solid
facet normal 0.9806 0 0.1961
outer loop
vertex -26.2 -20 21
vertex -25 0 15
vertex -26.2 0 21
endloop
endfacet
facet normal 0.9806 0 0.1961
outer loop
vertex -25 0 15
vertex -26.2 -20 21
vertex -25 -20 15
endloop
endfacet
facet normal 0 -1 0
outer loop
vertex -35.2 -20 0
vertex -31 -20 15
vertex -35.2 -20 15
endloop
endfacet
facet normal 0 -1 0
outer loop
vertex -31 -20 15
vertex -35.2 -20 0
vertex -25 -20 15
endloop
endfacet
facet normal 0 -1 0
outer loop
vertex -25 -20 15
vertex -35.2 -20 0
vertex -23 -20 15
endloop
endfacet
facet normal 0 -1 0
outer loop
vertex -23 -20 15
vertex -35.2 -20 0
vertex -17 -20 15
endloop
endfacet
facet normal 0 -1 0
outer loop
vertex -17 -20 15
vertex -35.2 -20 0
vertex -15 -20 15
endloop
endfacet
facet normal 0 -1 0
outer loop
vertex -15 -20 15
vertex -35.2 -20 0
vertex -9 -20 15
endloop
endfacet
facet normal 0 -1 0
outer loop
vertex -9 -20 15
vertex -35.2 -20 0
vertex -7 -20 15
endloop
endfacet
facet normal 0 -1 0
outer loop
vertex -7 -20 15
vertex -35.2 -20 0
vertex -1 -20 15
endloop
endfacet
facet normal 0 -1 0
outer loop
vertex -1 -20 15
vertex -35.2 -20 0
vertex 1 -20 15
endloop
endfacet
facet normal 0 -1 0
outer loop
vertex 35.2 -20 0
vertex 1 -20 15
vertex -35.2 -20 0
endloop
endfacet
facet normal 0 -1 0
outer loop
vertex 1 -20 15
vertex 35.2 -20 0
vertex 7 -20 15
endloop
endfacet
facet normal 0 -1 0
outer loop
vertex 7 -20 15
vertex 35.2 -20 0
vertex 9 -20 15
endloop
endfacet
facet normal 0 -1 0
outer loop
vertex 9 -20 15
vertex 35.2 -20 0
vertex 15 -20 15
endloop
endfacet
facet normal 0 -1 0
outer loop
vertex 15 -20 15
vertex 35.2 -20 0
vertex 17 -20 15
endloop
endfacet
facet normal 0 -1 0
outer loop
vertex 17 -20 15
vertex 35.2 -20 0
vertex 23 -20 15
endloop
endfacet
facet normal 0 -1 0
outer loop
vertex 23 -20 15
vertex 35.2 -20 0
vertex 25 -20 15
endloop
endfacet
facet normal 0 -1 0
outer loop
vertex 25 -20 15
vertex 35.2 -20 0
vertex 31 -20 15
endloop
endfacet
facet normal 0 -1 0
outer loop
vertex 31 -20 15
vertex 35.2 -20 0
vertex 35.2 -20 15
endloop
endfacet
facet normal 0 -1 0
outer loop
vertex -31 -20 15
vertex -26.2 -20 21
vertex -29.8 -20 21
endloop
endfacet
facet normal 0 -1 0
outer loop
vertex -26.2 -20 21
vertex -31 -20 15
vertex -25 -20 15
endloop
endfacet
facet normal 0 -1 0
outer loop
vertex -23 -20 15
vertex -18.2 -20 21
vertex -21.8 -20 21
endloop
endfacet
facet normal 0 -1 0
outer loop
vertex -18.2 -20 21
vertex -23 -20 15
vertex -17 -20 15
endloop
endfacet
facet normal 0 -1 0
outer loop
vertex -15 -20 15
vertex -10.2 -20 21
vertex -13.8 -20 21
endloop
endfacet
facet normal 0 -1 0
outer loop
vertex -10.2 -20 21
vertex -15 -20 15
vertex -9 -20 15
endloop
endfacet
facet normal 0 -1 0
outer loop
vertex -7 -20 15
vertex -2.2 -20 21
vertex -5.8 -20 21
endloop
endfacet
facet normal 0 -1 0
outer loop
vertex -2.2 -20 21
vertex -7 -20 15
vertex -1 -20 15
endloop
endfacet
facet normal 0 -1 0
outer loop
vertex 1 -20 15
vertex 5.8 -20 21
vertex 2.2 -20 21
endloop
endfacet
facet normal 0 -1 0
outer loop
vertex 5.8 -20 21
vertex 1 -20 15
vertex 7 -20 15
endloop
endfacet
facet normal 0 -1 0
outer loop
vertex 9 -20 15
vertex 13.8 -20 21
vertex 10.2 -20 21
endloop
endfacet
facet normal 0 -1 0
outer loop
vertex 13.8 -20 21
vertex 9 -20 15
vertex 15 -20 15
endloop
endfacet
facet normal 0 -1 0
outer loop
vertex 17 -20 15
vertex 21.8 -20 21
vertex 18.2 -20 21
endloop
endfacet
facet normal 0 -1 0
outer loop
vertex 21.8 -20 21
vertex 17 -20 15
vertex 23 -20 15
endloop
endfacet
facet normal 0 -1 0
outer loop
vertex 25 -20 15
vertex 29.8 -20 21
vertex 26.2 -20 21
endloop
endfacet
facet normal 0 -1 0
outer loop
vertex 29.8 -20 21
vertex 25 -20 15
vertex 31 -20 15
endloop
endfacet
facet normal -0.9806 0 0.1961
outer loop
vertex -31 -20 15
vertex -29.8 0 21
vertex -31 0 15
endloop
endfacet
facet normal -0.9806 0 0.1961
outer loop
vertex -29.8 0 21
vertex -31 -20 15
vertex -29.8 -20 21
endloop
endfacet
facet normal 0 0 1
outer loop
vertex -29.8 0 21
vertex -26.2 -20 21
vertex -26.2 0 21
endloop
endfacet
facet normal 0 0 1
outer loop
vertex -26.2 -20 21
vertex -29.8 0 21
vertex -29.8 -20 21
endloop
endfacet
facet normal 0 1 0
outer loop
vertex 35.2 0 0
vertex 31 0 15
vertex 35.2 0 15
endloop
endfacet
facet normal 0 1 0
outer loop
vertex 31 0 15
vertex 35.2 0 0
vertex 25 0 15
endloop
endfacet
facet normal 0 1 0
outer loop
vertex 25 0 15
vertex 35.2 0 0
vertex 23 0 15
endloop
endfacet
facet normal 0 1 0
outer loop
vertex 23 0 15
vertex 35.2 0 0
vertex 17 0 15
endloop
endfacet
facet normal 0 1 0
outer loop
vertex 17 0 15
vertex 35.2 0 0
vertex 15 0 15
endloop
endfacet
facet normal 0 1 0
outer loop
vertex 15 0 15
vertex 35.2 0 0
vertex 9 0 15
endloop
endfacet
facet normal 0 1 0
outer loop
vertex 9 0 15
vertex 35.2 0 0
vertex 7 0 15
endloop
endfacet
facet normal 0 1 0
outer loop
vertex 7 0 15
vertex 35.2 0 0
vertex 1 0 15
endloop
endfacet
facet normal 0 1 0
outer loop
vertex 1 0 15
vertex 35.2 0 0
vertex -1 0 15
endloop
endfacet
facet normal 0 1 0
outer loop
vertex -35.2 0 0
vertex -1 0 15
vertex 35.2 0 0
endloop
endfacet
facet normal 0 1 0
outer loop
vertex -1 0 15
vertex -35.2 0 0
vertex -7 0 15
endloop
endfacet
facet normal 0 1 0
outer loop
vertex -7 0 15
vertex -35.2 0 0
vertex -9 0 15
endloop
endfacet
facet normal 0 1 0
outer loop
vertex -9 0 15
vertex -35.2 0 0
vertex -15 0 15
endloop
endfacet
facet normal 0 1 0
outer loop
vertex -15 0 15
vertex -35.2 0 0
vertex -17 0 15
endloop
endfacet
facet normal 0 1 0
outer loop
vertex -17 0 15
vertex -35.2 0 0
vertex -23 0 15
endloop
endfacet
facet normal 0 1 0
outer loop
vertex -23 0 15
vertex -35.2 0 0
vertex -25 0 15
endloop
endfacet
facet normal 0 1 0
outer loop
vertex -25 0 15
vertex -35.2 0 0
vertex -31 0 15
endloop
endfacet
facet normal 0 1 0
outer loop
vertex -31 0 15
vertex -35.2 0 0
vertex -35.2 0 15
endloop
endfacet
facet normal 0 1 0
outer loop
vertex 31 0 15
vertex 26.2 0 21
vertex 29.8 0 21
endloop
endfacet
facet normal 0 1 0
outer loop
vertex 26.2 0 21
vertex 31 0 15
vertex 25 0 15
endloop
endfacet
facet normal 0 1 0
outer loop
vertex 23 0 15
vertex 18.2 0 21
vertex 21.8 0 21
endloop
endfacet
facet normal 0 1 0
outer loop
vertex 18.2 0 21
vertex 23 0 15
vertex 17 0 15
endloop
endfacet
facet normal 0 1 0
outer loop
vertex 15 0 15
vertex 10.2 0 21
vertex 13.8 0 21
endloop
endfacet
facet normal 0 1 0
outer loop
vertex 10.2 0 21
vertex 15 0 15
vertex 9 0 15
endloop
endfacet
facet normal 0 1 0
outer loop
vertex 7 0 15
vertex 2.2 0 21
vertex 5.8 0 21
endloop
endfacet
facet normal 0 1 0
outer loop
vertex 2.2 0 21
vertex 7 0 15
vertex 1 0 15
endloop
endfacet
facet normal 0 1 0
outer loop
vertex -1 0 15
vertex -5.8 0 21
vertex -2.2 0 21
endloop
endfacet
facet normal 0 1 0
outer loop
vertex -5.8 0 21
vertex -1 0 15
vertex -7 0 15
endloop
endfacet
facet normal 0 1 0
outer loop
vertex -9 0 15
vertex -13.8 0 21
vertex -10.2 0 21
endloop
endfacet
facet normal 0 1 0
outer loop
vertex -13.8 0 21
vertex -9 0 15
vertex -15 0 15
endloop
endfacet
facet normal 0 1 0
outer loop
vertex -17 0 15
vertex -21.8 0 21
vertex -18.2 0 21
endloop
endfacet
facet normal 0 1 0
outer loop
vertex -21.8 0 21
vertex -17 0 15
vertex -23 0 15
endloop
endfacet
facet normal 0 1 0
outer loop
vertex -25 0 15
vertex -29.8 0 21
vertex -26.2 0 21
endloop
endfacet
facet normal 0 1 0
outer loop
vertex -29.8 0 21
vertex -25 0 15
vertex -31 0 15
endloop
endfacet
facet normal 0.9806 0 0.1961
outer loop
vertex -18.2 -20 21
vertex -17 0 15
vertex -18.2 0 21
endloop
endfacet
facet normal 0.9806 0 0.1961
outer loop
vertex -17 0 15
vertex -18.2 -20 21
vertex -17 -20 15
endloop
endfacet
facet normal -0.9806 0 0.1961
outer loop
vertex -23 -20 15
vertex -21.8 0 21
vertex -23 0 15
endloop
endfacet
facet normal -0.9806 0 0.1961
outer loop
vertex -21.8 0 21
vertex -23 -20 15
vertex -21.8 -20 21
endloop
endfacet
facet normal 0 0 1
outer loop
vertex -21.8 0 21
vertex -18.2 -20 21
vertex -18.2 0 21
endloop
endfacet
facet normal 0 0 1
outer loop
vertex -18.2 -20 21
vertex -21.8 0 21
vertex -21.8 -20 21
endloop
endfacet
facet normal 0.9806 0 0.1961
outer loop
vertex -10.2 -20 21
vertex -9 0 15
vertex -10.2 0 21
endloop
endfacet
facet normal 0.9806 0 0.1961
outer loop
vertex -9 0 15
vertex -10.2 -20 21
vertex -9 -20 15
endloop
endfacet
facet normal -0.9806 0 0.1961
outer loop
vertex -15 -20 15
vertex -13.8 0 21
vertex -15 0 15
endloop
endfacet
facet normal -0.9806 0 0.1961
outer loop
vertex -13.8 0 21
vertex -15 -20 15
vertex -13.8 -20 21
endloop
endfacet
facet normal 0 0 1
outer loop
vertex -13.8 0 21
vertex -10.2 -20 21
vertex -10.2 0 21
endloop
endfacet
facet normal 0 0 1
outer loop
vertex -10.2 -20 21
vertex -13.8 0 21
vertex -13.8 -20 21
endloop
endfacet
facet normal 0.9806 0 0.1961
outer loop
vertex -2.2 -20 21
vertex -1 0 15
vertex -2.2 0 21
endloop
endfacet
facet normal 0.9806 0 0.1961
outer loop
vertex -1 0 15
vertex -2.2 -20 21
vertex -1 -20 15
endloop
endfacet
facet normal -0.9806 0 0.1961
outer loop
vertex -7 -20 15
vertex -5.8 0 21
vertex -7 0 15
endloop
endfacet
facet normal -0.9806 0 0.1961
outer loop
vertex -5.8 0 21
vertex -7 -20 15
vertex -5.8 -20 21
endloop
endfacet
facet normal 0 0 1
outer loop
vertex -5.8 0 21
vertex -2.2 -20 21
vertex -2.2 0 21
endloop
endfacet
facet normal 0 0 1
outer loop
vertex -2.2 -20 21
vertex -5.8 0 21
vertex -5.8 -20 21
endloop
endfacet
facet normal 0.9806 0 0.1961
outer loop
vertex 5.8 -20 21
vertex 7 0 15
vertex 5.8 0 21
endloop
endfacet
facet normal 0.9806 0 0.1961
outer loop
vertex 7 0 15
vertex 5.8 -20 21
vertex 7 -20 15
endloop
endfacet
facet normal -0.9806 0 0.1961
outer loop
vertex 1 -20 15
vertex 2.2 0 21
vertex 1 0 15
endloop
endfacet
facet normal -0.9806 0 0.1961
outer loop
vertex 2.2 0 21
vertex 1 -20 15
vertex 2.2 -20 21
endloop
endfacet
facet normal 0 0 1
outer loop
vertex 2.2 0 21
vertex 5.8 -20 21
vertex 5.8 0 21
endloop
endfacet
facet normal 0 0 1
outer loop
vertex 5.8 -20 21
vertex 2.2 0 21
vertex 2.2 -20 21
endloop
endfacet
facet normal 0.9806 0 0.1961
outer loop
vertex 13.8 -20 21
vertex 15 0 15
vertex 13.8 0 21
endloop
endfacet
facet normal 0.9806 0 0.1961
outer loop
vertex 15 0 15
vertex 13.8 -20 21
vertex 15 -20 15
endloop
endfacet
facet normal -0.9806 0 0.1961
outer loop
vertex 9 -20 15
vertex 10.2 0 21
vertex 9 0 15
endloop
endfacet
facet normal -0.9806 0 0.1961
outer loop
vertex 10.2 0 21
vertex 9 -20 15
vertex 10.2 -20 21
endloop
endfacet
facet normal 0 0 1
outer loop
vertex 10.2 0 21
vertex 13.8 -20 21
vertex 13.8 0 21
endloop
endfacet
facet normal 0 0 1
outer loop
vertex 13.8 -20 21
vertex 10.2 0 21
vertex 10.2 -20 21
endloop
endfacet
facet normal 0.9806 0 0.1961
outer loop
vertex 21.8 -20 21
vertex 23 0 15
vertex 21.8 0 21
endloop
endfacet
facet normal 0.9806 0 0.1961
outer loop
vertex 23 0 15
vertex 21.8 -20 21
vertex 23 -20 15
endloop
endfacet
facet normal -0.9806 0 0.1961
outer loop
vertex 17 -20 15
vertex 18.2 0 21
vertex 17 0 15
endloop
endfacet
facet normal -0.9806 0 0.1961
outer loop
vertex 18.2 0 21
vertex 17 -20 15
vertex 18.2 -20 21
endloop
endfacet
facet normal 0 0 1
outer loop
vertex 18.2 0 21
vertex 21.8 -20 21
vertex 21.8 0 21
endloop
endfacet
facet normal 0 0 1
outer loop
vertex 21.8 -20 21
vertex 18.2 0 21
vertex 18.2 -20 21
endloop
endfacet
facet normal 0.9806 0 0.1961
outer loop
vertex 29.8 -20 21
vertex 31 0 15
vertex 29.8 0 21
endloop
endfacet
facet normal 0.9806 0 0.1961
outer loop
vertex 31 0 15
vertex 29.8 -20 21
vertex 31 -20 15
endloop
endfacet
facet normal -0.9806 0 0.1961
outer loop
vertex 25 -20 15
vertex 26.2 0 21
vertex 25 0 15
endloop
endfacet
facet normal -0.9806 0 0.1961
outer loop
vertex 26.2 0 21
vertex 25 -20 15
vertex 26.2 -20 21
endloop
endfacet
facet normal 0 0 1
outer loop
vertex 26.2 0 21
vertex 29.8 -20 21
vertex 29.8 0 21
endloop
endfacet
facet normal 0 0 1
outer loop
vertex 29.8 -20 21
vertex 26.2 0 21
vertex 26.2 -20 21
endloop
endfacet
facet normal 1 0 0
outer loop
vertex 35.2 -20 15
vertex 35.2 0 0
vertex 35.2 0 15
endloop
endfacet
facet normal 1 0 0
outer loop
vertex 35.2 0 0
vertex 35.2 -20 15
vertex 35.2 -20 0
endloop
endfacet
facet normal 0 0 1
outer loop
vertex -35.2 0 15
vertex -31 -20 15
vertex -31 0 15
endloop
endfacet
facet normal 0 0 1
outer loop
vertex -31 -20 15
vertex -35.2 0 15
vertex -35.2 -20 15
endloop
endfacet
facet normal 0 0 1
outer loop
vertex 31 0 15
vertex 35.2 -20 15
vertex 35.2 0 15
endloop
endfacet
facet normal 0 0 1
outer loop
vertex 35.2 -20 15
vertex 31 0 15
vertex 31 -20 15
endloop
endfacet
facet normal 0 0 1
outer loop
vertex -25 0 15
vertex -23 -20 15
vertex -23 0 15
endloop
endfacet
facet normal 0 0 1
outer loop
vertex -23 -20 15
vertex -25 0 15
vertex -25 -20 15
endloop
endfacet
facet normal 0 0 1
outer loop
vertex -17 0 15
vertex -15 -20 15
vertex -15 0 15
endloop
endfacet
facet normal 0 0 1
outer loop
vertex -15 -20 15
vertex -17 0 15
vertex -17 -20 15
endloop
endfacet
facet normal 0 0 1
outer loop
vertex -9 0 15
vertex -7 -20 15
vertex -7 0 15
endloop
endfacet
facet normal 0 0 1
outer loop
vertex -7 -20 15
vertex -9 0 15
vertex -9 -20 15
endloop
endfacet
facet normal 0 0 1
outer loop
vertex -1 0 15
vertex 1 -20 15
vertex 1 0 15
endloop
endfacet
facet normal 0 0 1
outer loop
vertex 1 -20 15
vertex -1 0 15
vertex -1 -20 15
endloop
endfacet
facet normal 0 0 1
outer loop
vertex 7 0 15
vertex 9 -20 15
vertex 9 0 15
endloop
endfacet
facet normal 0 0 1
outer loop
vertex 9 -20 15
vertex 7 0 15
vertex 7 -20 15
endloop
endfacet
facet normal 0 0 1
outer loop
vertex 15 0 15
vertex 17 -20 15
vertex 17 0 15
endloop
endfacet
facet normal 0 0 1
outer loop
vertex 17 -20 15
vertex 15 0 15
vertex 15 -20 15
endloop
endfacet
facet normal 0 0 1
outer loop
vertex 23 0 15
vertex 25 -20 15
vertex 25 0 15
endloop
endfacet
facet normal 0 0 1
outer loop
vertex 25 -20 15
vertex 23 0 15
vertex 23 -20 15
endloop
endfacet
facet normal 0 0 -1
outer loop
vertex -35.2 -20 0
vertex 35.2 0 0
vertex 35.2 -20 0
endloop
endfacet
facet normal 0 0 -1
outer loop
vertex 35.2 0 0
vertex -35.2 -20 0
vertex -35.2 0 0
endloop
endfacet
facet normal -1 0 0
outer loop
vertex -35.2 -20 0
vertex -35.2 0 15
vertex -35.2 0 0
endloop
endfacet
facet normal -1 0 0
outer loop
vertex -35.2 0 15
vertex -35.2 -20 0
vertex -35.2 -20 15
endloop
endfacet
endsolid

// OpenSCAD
$fn = 32;

// ----------------------------------------------------------------------
// Toothed rack, 8 teeth
// 8 mm pitch, 6 mm teeth
// ----------------------------------------------------------------------

// --- parameters (mm) ---
bar_w = 20;     // bar width (Y)
bar_h = 15;     // bar height (Z)
teeth = 8;      // number of teeth
pitch = 8;      // tooth pitch
tooth_h = 6;    // tooth height above the bar
root_w = 6.4;   // tooth width at the root
crest_w = 3.6;  // tooth width at the crest

// --- derived feature positions (mm) ---
span = (teeth - 1) * pitch;  // = 56   distance between the outer teeth
bar_l = span + root_w + 8;   // = 70.4   bar length: teeth plus 4 mm at each end
tooth_x = -span / 2;         // = -28   X of the first tooth
height = bar_h + tooth_h;    // = 21   overall height
feature_centers = [
  [tooth_x + 0 * pitch, -bar_w / 2],
  [tooth_x + 1 * pitch, -bar_w / 2],
  [tooth_x + 2 * pitch, -bar_w / 2],
  [tooth_x + 3 * pitch, -bar_w / 2],
  [tooth_x + 4 * pitch, -bar_w / 2],
  [tooth_x + 5 * pitch, -bar_w / 2],
  [tooth_x + 6 * pitch, -bar_w / 2],
  [tooth_x + 7 * pitch, -bar_w / 2]
];   // tooth centre line, drives the tooth loop

// bar with a rack of teeth, one extruded trapezoium per centre
module rack_tooth() {
  linear_extrude(height = bar_w)
    polygon(points = [
      [0, 0],
      [root_w, 0],
      [root_w / 2 + crest_w / 2, tooth_h + 1],
      [root_w / 2 - crest_w / 2, tooth_h + 1]
    ]);
}

union() {
  translate([-bar_l / 2, -bar_w, 0]) cube([bar_l, bar_w, bar_h]);
  for (centre = feature_centers)
    translate([centre[0] - root_w / 2, 0, bar_h - 1]) rotate([90, 0, 0]) rack_tooth();
}
